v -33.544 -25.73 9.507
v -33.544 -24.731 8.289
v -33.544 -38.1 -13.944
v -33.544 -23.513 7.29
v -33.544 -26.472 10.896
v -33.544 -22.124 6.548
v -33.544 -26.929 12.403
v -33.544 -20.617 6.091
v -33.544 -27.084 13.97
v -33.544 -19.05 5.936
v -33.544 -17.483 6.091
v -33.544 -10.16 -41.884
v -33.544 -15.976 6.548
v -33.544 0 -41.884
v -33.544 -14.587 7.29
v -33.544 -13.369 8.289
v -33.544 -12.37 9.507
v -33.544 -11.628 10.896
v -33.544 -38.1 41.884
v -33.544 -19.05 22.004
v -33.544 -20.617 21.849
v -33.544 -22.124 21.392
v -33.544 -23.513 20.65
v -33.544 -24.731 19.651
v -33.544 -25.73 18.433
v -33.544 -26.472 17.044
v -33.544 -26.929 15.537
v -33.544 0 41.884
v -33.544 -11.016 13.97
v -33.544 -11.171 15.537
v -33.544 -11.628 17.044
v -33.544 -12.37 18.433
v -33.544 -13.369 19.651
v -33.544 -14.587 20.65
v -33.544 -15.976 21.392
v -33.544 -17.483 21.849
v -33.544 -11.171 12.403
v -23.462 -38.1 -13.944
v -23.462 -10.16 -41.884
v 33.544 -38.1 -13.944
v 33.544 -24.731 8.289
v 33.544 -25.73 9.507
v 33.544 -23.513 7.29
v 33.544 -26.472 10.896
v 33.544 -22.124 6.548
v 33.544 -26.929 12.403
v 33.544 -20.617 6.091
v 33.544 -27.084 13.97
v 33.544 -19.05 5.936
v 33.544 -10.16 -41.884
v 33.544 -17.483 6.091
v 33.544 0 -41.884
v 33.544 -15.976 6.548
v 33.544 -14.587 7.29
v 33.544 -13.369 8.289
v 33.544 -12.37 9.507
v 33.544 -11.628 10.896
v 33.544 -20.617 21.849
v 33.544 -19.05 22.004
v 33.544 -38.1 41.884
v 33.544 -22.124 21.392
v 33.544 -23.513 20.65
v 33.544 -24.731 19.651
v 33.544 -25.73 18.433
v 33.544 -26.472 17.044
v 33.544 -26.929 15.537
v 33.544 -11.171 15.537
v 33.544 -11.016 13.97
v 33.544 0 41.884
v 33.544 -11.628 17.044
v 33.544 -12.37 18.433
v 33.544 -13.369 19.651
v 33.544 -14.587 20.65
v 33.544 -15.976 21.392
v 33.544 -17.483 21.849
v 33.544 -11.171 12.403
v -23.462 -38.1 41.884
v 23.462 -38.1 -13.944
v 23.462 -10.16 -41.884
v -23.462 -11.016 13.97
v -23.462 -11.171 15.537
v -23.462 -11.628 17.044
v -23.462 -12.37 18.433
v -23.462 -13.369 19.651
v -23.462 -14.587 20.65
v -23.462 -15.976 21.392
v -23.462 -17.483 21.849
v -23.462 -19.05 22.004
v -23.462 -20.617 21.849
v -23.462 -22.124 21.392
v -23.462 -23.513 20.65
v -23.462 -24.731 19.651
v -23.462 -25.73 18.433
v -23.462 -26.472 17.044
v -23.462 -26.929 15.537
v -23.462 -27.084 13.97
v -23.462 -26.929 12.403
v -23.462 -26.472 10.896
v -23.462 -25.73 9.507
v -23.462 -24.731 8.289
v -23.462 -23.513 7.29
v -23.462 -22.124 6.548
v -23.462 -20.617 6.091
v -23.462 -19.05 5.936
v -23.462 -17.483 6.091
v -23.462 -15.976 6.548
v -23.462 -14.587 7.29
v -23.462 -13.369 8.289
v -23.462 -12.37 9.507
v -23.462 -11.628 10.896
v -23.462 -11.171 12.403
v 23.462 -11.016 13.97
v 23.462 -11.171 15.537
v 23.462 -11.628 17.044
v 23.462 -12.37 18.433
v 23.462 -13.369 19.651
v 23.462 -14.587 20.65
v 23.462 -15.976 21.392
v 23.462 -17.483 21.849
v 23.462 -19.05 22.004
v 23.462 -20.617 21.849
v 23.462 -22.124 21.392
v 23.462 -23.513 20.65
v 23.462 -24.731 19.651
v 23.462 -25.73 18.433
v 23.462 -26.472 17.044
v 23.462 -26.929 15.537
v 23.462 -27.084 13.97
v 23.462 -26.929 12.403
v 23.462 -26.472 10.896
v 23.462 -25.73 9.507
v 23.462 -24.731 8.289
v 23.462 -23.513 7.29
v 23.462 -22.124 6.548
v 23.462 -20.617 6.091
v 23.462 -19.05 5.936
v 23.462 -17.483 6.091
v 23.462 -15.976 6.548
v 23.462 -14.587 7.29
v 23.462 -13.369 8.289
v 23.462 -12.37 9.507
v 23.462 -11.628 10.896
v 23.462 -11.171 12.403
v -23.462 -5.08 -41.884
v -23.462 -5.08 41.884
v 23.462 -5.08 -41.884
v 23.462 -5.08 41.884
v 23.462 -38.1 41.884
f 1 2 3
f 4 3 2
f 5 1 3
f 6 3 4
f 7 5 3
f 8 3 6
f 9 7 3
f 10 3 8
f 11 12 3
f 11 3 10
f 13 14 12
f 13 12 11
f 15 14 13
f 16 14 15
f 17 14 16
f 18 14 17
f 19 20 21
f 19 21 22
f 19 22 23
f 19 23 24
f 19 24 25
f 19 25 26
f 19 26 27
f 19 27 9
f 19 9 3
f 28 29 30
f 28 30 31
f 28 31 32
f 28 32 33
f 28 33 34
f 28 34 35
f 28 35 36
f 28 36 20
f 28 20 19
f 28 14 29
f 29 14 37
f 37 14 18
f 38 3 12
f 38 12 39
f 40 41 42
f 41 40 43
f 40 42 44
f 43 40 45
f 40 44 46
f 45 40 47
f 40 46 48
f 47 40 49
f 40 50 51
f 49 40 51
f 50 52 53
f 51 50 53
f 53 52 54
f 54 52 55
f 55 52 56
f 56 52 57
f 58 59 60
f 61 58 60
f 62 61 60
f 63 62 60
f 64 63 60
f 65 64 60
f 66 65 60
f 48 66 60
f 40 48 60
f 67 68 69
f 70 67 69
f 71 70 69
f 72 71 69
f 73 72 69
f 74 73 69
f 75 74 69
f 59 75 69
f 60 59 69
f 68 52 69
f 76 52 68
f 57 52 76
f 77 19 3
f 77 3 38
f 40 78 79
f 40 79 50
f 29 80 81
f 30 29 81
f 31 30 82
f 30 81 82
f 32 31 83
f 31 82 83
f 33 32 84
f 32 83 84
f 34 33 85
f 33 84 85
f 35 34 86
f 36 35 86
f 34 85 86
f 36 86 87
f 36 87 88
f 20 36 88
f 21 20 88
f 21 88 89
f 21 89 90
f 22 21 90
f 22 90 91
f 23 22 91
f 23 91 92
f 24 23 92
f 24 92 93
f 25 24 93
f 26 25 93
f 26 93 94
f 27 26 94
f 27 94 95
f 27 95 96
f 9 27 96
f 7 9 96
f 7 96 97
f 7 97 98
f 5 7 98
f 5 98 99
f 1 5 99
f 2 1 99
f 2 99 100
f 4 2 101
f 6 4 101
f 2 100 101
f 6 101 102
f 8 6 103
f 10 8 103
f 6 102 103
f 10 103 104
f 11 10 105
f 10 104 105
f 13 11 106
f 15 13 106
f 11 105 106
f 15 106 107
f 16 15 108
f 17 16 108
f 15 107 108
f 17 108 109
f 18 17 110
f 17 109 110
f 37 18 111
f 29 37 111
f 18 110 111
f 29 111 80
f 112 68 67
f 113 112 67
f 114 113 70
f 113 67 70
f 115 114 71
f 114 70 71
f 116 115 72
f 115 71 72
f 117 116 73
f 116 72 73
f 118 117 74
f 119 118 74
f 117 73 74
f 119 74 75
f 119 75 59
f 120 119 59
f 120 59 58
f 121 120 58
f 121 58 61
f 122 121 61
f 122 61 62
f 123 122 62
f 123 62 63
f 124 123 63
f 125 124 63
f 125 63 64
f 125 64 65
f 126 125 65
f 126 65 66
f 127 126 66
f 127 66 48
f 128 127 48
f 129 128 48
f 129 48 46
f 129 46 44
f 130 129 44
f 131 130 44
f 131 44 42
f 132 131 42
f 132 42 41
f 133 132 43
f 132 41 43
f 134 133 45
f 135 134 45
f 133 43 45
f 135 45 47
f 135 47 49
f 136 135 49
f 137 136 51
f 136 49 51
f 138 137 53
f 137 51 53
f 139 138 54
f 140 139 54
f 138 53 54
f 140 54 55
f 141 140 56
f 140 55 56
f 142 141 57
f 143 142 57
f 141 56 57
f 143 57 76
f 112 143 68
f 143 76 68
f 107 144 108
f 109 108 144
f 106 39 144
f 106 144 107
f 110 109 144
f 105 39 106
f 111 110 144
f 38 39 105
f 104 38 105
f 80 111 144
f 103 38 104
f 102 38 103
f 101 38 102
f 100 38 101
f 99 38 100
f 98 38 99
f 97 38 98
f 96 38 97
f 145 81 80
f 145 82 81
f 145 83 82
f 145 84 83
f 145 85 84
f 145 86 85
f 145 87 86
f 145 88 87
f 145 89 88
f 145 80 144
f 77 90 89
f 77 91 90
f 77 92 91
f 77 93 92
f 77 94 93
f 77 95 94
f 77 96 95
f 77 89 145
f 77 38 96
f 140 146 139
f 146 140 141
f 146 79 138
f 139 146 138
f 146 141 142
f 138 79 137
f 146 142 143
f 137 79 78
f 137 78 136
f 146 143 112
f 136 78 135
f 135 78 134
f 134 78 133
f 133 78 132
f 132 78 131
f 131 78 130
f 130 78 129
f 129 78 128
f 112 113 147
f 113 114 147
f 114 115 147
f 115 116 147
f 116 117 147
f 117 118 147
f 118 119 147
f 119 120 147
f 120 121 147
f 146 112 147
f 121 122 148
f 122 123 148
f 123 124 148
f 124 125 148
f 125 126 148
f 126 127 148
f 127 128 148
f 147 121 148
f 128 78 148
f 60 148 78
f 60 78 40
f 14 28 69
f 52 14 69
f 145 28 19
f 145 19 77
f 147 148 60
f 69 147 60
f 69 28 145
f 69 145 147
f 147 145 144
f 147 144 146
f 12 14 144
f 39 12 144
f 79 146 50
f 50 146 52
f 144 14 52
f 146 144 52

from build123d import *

# Parameters (mm, degrees)
F0_W     = 67.0874267817
F0_H     = 83.7676301599
F1_DEPTH = 38.1
F2_W     = 46.9245351851
F2_H     = 83.7676301599
F3_DEPTH = 33.02
F4_SIZE  = 27.94
F5_SIZE  = 27.94
F6_R     = 8.0338499756
F7_DEPTH = 67.0884267817


with BuildPart() as f1:
    # F0 (on Front) → F1 (new body)
    with BuildSketch(Plane.XZ):
        Rectangle(F0_W, F0_H)
    extrude(amount=F1_DEPTH)

    # F2 (on face) → F3 (cut)
    with BuildSketch(Plane.XZ.offset(38.1)):
        Rectangle(F2_W, F2_H)
    extrude(amount=-F3_DEPTH, mode=Mode.SUBTRACT)

    # F4
    f4_edges = [f1.edges().sort_by_distance(p)[0] for p in [
        (28.50299, -38.1, -41.883815),
    ]]
    chamfer(f4_edges, length=F4_SIZE)

    # F5
    f5_edges = [f1.edges().sort_by_distance(p)[0] for p in [
        (-28.50299, -38.1, -41.883815),
    ]]
    chamfer(f5_edges, length=F5_SIZE)

    # F6 (on face) → F7 (cut, through all)
    with BuildSketch(Plane.YZ.offset(33.5437133908)):
        with Locations((-19.05, 13.97)):
            Circle(F6_R)
    extrude(amount=-F7_DEPTH, mode=Mode.SUBTRACT)


solid = f1.part
